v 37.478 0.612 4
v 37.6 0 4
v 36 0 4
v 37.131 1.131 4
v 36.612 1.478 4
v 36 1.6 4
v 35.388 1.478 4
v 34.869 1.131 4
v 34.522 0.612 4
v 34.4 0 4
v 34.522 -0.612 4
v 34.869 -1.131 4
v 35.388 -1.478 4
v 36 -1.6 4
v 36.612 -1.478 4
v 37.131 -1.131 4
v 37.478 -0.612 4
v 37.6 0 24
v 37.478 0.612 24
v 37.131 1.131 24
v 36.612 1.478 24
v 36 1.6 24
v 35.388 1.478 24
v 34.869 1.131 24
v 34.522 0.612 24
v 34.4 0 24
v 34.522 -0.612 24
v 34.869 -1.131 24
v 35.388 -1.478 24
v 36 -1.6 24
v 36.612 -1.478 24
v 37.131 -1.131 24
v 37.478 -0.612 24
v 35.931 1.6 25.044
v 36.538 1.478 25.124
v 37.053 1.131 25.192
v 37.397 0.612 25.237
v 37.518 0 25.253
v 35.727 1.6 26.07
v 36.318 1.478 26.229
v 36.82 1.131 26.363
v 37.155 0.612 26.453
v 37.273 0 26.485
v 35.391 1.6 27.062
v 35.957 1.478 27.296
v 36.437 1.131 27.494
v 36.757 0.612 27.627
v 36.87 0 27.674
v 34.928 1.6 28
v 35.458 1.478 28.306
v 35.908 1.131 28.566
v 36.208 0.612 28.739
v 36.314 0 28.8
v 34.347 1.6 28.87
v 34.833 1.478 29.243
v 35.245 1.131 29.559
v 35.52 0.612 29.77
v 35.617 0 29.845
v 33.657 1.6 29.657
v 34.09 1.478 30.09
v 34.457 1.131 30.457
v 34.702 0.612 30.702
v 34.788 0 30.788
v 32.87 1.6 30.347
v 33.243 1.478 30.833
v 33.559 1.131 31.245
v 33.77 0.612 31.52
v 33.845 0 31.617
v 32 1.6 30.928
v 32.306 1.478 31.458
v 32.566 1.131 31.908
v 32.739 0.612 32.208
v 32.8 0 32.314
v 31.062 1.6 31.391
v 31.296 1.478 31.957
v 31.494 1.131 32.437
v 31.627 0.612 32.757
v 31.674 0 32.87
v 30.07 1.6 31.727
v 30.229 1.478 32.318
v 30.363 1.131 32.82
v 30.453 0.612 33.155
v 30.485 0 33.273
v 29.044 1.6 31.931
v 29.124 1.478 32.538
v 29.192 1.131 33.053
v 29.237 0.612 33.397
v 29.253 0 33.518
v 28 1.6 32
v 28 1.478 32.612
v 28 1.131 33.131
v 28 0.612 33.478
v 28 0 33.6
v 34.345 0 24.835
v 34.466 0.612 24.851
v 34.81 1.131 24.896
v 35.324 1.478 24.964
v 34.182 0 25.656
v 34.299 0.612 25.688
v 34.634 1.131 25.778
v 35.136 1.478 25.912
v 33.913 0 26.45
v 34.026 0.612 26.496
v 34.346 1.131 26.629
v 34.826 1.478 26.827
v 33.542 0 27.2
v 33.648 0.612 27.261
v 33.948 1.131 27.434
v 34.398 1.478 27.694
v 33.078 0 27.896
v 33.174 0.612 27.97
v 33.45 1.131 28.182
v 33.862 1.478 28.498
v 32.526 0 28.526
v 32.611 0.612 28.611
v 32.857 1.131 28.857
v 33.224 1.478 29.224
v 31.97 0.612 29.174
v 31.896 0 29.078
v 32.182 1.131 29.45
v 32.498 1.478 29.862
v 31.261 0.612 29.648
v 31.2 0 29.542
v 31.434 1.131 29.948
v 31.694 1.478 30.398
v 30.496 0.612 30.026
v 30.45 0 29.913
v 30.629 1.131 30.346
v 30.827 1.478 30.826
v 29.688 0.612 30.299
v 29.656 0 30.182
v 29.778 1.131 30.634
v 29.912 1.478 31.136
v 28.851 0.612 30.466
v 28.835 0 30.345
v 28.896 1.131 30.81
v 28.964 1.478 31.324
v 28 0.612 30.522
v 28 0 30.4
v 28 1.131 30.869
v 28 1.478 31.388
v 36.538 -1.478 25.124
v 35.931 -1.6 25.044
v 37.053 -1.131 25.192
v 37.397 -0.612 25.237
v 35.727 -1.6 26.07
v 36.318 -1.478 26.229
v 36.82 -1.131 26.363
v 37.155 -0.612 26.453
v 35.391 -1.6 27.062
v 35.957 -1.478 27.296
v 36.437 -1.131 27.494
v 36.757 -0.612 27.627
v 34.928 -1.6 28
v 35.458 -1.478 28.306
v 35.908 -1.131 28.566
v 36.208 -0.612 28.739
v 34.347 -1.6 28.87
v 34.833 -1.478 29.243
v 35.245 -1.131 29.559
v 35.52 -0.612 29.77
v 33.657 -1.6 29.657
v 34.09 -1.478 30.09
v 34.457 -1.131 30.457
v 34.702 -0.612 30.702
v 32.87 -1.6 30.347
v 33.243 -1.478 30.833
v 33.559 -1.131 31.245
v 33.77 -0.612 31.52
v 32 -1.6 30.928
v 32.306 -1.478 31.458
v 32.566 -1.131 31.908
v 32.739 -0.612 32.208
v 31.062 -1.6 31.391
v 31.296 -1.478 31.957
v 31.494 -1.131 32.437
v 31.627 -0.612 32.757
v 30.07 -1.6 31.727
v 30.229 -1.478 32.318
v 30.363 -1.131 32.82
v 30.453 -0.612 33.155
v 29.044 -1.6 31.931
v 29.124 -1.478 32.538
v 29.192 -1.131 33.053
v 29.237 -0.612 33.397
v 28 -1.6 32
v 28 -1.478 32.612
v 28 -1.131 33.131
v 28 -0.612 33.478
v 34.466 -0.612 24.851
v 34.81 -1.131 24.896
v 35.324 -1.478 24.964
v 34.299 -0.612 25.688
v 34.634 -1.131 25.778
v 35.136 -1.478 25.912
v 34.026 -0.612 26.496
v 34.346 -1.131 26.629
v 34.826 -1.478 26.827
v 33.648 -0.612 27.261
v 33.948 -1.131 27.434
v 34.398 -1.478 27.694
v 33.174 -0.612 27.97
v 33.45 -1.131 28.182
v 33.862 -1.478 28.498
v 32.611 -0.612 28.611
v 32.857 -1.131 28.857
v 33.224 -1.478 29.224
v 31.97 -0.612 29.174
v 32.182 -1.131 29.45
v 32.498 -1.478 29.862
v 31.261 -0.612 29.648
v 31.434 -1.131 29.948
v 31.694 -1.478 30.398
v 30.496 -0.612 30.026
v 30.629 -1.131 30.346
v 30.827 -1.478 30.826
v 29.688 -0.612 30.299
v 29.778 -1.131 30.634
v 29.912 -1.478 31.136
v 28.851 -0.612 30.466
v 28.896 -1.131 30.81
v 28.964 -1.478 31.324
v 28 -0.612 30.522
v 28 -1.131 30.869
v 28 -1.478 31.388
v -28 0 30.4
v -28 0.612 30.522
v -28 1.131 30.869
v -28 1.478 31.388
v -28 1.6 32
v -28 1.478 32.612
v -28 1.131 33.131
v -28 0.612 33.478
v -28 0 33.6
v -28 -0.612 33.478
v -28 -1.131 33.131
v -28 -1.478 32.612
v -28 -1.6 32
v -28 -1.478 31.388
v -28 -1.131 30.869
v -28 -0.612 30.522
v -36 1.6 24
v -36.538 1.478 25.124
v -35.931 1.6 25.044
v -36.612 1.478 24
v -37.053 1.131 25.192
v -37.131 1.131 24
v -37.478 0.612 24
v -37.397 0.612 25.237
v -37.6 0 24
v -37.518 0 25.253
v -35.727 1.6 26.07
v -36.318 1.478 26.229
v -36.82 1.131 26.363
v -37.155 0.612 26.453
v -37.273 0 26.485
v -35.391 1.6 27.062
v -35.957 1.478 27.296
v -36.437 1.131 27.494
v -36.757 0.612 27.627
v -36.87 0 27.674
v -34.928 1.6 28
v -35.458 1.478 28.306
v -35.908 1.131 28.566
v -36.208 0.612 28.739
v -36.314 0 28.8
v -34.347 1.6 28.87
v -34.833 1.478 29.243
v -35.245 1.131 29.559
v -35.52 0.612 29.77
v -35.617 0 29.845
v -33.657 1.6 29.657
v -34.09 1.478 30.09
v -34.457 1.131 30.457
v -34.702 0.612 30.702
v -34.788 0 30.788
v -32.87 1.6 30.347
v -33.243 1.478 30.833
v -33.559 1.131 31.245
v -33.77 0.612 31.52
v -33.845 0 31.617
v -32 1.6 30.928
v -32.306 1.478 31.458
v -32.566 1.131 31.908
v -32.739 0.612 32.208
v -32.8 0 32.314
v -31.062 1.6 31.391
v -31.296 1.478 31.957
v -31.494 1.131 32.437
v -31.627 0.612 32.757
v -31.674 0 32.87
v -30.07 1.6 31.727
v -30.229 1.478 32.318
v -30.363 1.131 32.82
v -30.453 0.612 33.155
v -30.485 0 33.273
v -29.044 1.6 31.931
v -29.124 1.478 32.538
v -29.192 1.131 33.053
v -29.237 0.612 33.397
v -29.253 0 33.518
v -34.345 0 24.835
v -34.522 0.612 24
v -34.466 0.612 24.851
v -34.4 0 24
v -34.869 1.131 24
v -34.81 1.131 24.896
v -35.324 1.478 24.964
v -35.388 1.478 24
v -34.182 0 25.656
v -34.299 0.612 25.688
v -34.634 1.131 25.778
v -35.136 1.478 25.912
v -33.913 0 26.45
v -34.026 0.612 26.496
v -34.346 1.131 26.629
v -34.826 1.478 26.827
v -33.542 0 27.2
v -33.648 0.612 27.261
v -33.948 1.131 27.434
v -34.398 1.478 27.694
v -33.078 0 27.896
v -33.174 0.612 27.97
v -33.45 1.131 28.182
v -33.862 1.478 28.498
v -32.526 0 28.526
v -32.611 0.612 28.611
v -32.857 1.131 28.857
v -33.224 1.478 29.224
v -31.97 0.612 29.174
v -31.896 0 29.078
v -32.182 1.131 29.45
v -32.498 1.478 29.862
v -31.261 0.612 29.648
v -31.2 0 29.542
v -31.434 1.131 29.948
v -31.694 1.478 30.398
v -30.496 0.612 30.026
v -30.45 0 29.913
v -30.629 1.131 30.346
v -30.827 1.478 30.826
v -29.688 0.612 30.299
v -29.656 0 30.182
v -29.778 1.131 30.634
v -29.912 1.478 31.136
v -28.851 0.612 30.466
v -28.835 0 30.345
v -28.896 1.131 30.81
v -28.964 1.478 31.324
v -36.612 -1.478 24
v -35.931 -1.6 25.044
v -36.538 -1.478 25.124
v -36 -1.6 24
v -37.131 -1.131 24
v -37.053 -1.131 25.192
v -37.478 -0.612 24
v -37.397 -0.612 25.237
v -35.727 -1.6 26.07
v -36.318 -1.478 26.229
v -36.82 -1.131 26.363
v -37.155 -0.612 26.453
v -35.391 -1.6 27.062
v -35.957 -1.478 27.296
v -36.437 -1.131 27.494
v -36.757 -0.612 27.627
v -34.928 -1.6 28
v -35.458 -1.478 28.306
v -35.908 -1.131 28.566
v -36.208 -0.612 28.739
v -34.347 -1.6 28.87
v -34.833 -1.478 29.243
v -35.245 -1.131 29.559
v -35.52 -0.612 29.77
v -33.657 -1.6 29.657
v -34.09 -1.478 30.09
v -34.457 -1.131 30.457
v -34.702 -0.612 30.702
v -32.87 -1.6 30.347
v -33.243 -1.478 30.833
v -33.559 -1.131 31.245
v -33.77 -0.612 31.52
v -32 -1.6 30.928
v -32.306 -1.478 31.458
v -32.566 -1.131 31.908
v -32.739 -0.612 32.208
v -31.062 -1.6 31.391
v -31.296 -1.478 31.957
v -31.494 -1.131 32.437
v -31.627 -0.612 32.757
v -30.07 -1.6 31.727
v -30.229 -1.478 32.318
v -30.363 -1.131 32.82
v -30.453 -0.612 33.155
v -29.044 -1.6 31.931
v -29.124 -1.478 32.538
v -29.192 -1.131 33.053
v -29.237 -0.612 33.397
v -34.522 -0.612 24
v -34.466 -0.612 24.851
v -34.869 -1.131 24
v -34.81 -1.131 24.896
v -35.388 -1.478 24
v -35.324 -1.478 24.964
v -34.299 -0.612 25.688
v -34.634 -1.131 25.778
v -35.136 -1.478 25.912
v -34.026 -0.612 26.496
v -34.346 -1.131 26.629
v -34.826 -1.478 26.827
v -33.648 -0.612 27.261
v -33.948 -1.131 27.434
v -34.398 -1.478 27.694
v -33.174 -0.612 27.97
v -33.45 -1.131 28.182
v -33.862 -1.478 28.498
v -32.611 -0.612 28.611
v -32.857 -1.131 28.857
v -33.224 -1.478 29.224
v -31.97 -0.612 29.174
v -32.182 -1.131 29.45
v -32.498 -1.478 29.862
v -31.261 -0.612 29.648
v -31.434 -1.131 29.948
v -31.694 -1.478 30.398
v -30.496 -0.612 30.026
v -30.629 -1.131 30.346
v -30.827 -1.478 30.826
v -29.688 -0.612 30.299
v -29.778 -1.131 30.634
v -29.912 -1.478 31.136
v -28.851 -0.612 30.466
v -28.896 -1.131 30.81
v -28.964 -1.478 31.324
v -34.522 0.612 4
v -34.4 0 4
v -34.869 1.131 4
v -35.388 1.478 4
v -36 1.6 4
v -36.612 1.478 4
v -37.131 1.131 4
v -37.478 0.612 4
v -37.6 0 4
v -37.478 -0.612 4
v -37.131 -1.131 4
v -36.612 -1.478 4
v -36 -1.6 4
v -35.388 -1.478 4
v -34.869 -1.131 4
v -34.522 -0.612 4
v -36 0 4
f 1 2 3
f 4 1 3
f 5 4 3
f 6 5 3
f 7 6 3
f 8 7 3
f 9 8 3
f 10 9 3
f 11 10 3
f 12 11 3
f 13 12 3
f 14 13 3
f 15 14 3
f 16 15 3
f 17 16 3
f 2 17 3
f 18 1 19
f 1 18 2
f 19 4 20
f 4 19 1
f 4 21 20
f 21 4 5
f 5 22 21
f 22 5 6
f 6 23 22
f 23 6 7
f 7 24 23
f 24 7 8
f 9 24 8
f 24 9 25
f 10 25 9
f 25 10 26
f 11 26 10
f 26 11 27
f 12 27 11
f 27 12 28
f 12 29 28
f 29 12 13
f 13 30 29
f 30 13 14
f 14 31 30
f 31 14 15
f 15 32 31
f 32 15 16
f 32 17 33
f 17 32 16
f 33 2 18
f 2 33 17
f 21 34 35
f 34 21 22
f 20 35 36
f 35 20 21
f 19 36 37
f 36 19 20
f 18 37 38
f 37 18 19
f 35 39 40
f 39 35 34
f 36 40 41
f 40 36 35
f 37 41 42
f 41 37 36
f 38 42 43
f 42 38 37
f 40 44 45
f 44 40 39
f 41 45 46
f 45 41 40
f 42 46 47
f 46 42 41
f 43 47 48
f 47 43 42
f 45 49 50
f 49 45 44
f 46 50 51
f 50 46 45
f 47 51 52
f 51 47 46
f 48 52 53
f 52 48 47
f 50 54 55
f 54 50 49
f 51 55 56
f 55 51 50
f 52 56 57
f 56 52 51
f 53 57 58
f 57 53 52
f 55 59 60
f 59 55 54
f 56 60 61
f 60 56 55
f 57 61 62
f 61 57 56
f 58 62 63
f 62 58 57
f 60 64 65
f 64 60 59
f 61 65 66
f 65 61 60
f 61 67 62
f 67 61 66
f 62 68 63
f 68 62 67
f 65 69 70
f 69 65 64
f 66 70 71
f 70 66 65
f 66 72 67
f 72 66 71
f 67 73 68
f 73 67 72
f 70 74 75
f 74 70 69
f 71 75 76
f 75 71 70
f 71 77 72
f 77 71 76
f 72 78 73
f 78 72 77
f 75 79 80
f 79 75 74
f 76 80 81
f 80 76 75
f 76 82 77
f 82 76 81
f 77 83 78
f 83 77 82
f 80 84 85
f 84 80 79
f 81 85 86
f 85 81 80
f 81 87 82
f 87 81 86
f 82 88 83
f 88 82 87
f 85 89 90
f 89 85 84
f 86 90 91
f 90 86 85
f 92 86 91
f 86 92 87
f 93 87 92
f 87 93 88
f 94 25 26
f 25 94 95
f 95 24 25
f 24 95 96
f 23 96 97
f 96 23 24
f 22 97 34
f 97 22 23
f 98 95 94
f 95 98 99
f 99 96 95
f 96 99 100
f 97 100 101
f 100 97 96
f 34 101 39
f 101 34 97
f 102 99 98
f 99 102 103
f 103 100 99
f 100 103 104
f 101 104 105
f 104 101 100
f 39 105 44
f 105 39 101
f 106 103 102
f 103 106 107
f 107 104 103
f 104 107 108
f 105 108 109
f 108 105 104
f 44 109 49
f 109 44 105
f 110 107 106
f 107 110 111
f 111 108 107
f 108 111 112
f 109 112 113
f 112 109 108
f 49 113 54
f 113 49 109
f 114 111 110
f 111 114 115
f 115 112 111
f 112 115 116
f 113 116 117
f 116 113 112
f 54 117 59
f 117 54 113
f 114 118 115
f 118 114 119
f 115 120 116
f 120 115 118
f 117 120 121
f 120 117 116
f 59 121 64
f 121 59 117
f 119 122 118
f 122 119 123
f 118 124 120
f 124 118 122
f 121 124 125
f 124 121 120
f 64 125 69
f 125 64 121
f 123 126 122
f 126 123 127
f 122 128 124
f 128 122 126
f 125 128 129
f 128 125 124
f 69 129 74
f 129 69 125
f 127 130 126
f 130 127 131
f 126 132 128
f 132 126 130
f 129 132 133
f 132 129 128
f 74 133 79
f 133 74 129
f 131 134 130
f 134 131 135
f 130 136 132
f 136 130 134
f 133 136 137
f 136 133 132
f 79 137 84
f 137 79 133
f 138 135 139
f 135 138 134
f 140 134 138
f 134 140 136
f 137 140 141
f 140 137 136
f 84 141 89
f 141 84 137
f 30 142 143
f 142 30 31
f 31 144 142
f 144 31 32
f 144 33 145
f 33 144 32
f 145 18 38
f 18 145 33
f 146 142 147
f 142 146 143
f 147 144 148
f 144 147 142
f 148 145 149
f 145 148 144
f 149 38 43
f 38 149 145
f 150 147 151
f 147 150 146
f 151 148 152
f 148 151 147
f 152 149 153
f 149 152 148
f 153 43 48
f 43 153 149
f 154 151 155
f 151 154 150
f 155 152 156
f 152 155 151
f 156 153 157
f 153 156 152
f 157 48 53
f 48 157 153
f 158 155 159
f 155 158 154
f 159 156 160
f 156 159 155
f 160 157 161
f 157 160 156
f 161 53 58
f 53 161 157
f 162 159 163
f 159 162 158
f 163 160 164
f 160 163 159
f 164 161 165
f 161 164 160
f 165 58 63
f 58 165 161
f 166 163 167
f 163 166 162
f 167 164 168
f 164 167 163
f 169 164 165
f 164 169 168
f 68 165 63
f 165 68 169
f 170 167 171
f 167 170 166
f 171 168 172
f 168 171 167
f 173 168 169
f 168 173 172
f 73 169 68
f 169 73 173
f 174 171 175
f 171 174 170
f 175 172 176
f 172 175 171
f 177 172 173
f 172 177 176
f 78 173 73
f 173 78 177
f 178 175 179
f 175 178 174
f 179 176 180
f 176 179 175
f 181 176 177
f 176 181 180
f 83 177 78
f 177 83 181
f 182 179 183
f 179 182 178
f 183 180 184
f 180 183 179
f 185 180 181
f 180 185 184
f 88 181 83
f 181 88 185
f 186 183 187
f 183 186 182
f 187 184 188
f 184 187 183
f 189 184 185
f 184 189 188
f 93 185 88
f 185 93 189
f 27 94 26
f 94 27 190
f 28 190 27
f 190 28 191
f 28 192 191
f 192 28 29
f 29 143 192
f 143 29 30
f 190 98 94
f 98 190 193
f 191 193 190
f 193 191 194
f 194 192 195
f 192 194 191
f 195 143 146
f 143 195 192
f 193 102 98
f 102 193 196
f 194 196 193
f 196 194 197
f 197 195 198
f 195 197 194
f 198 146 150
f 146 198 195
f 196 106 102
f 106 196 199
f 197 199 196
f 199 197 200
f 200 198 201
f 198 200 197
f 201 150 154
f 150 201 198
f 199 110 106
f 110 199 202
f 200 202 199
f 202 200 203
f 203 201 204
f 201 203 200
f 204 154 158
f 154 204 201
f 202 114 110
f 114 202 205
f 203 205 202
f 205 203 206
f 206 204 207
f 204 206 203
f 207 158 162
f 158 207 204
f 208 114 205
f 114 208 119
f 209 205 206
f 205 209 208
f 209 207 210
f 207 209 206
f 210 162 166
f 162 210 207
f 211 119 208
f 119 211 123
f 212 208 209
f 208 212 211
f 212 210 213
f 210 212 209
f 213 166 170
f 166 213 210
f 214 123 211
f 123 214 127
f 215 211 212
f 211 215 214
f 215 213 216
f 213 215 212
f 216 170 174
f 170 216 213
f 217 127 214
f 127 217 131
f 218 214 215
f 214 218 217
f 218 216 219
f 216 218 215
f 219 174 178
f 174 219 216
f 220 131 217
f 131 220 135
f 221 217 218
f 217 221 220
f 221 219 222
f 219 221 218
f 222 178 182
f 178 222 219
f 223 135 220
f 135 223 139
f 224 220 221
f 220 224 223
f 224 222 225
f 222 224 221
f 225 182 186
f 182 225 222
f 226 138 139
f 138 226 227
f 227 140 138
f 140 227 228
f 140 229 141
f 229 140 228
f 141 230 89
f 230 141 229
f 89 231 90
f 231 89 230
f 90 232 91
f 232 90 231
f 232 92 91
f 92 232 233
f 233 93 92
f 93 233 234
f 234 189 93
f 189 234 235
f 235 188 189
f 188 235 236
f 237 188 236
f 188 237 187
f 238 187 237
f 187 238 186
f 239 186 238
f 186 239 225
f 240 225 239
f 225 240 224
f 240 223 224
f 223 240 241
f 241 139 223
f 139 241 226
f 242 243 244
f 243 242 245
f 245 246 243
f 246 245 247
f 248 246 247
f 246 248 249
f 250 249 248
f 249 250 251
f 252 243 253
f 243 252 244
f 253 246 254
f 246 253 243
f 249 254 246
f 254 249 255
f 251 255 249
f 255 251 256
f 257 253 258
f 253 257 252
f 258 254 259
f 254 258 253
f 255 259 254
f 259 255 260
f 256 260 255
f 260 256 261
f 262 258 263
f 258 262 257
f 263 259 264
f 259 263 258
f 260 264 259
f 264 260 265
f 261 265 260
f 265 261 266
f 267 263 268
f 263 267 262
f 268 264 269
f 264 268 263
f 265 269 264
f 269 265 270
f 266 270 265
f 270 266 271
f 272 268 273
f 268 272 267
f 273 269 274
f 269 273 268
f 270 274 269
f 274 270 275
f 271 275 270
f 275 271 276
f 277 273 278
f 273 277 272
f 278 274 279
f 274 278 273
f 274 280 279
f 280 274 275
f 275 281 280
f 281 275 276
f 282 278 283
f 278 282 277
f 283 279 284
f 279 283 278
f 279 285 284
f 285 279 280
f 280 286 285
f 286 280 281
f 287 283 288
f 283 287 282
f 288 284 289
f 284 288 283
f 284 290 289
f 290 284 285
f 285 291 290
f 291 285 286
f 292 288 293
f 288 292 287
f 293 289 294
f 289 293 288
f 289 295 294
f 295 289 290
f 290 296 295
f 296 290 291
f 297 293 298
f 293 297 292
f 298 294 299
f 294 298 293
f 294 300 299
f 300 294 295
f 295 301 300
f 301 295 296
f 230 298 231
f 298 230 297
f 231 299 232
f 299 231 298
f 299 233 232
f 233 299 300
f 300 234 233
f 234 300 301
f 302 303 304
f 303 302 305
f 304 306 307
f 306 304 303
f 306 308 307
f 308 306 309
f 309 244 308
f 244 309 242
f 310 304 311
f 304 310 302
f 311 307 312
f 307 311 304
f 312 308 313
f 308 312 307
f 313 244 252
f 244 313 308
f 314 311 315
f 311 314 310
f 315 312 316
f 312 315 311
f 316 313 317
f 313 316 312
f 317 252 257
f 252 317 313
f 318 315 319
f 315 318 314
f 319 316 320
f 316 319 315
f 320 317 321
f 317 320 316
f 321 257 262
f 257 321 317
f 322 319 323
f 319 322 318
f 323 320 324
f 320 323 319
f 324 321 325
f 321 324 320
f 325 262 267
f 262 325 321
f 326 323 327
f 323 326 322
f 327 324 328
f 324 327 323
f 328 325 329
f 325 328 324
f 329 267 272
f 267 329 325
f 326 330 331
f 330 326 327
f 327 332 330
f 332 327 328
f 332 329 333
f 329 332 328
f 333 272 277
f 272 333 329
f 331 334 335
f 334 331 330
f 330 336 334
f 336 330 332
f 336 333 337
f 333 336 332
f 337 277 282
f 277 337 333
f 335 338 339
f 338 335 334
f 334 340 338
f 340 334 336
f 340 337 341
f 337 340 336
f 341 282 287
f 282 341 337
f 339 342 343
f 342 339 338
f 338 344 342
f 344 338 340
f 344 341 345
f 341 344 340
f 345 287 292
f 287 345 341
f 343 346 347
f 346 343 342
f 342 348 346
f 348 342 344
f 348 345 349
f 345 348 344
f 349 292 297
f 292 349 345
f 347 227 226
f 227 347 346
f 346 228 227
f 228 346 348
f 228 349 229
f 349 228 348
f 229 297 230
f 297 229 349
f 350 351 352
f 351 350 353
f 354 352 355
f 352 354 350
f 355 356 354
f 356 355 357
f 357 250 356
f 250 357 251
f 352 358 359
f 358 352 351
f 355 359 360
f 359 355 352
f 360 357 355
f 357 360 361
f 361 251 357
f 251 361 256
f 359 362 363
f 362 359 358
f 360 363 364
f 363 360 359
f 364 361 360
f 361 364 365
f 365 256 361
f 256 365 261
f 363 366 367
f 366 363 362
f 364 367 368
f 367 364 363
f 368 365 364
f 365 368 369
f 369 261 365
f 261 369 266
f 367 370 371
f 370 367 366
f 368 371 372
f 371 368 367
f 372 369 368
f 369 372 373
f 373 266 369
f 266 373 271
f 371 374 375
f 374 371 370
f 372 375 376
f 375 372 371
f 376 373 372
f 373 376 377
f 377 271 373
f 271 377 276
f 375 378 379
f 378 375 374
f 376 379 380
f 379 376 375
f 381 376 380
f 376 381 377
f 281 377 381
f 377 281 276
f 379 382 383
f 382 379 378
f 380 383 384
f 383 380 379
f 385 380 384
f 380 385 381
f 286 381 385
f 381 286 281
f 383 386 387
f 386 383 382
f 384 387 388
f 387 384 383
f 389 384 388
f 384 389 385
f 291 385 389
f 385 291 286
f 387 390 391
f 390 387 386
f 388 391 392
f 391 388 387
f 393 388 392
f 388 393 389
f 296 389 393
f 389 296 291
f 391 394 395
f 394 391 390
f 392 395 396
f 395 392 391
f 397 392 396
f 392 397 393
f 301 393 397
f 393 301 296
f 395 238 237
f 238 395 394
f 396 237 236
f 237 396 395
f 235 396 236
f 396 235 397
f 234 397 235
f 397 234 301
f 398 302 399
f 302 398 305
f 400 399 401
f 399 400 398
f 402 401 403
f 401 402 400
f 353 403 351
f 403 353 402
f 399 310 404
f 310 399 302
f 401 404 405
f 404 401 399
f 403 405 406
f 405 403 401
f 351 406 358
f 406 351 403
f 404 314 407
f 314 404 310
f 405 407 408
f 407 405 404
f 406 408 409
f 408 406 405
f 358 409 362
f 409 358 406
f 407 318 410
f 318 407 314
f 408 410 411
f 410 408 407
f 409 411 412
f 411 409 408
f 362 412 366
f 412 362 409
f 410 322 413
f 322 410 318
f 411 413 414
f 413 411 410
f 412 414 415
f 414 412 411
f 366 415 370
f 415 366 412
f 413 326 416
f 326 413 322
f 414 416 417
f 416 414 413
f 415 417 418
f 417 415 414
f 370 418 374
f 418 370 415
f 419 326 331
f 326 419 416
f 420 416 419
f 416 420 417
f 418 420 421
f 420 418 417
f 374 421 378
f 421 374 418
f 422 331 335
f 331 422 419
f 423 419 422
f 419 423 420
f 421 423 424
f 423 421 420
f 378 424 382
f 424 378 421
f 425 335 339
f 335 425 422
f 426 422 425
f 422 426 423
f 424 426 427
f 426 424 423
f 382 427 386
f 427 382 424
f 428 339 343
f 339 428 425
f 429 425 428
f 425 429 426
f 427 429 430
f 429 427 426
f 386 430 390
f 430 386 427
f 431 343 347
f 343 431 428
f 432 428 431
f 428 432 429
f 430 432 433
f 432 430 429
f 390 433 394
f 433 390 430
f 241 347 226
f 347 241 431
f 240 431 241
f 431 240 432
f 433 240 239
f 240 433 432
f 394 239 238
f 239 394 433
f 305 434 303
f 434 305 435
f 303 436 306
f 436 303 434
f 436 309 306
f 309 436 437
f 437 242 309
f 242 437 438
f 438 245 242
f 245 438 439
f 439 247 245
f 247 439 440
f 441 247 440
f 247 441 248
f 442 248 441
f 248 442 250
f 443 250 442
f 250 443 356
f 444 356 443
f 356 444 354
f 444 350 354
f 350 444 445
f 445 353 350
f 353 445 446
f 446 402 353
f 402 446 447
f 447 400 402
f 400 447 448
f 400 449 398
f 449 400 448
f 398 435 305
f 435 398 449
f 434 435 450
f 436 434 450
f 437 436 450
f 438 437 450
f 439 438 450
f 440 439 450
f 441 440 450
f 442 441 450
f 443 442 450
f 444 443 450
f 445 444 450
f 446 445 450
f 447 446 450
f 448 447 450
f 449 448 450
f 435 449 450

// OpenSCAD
use <../../lib.scad>
use <../../p/4-4cyli.scad>
use <../../p/4-4disc.scad>
use <../../p/4-4edge.scad>
use <../../p/48/tm04i2000.scad>
use <../../p/48/tm04o2000.scad>
function ldraw_lib__s__115551s02() = [
// 0 ~Windscreen  1 x  9 x  4 with Double Curved Bar - Bar
// 0 Name: s\115551s02.dat
// 0 Author: Rene Rechthaler [Blechtaler]
// 0 !LDRAW_ORG Subpart UPDATE 2026-04
// 0 !LICENSE Licensed under CC BY 4.0 : see CAreadme.txt
// 
// 0 BFC CERTIFY CCW
  [0,"BFC","CERTIFY"],
  [0,"BFC","CCW"],
// 
// 0 !HISTORY 2026-04-27 [OrionP] Official Update 2026-04
// 
// 1 16 90 -10 0 4 0 0 0 -1 0 0 0 4 4-4disc.dat
  [1,16,90,-10,0,4,0,0,0,-1,0,0,0,4, ldraw_lib__4_4disc()],
// 1 16 90 -10 0 4 0 0 0 1 0 0 0 4 4-4edge.dat
  [1,16,90,-10,0,4,0,0,0,1,0,0,0,4, ldraw_lib__4_4edge()],
// 1 16 90 -10 0 4 0 0 0 -50 0 0 0 4 4-4cyli.dat
  [1,16,90,-10,0,4,0,0,0,-50,0,0,0,4, ldraw_lib__4_4cyli()],
// 1 16 70 -60 0 20 0 0 0 0 -20 0 20 0 48\tm04o2000.dat
  [1,16,70,-60,0,20,0,0,0,0,-20,0,20,0, ldraw_lib__48__tm04o2000()],
// 1 16 70 -60 0 20 0 0 0 0 -20 0 20 0 48\tm04i2000.dat
  [1,16,70,-60,0,20,0,0,0,0,-20,0,20,0, ldraw_lib__48__tm04i2000()],
// 1 16 70 -60 0 20 0 0 0 0 -20 0 -20 0 48\tm04o2000.dat
  [1,16,70,-60,0,20,0,0,0,0,-20,0,-20,0, ldraw_lib__48__tm04o2000()],
// 1 16 70 -60 0 20 0 0 0 0 -20 0 -20 0 48\tm04i2000.dat
  [1,16,70,-60,0,20,0,0,0,0,-20,0,-20,0, ldraw_lib__48__tm04i2000()],
// 1 16 70 -80 0 0 -140 0 4 0 0 0 0 4 4-4cyli.dat
  [1,16,70,-80,0,0,-140,0,4,0,0,0,0,4, ldraw_lib__4_4cyli()],
// 1 16 -70 -60 0 -20 0 0 0 0 -20 0 20 0 48\tm04o2000.dat
  [1,16,-70,-60,0,-20,0,0,0,0,-20,0,20,0, ldraw_lib__48__tm04o2000()],
// 1 16 -70 -60 0 -20 0 0 0 0 -20 0 20 0 48\tm04i2000.dat
  [1,16,-70,-60,0,-20,0,0,0,0,-20,0,20,0, ldraw_lib__48__tm04i2000()],
// 1 16 -70 -60 0 -20 0 0 0 0 -20 0 -20 0 48\tm04o2000.dat
  [1,16,-70,-60,0,-20,0,0,0,0,-20,0,-20,0, ldraw_lib__48__tm04o2000()],
// 1 16 -70 -60 0 -20 0 0 0 0 -20 0 -20 0 48\tm04i2000.dat
  [1,16,-70,-60,0,-20,0,0,0,0,-20,0,-20,0, ldraw_lib__48__tm04i2000()],
// 1 16 -90 -10 0 4 0 0 0 -50 0 0 0 4 4-4cyli.dat
  [1,16,-90,-10,0,4,0,0,0,-50,0,0,0,4, ldraw_lib__4_4cyli()],
// 1 16 -90 -10 0 4 0 0 0 1 0 0 0 4 4-4edge.dat
  [1,16,-90,-10,0,4,0,0,0,1,0,0,0,4, ldraw_lib__4_4edge()],
// 1 16 -90 -10 0 4 0 0 0 -1 0 0 0 4 4-4disc.dat
  [1,16,-90,-10,0,4,0,0,0,-1,0,0,0,4, ldraw_lib__4_4disc()],
];
module ldraw_lib__s__115551s02(step=0, col=false, unit=2/5, alt=false, line=0.2, solid=!$preview)
    makepoly(ldraw_lib__s__115551s02(), step=step, col=col, unit=unit, alt=alt, line=line, solid=solid);
ldraw_lib__s__115551s02(line=0.2);
